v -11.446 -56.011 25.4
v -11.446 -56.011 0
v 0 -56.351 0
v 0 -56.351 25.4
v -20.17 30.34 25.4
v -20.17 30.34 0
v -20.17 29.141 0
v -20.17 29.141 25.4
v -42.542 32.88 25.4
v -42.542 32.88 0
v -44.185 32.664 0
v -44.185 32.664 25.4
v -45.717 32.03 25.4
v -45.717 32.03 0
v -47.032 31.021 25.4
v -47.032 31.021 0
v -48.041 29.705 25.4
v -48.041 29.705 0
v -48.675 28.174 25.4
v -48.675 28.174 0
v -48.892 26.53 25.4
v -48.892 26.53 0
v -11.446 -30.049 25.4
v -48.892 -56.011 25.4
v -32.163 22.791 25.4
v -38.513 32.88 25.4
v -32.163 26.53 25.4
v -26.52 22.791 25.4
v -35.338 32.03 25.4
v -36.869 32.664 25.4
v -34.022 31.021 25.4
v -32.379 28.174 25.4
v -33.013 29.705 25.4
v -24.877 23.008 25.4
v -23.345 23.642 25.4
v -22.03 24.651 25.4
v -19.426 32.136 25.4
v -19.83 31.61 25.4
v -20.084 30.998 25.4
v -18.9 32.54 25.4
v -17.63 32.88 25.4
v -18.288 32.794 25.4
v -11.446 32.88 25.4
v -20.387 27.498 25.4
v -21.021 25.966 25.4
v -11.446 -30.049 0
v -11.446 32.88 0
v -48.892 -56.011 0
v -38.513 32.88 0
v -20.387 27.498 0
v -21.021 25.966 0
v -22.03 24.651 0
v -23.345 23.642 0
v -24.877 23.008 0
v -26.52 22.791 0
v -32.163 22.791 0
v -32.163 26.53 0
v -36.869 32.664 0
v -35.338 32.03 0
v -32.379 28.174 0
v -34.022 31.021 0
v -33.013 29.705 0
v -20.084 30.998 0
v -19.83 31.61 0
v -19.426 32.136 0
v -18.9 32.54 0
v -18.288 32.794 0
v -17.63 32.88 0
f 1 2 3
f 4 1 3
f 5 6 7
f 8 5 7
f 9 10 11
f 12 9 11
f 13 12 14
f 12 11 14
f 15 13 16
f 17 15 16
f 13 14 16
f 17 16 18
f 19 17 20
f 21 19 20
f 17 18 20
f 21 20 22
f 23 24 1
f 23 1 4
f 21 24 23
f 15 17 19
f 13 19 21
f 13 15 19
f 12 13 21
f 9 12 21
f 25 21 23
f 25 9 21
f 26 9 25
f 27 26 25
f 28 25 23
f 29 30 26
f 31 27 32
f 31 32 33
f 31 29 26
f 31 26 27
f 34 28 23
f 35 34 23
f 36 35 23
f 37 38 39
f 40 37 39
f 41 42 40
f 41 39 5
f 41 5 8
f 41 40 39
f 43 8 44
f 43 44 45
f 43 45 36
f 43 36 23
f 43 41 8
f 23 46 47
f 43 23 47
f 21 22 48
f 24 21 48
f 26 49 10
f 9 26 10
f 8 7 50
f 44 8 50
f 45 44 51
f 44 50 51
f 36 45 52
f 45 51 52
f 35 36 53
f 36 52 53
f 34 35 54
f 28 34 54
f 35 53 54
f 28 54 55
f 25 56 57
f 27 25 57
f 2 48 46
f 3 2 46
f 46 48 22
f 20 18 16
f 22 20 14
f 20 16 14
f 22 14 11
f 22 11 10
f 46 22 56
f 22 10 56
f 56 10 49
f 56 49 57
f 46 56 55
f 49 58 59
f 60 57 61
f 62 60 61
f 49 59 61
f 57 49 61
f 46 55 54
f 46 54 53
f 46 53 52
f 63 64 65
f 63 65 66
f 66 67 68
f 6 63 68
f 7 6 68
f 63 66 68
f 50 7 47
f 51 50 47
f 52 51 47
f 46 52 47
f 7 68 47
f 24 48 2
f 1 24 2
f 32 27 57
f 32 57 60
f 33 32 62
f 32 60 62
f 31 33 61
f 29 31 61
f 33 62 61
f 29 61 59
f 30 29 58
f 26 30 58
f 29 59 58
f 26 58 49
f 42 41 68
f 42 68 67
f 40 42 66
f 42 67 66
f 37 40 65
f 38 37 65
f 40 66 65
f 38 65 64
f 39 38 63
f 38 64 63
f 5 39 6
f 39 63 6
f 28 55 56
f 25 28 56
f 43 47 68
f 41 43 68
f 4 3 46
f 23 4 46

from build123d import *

# Parameters (mm, degrees)
F1_DEPTH = 25.4


with BuildPart() as f1:
    # F0 (on Top) → F1 (new body)
    with BuildSketch(Plane.XY):
        with BuildLine():
            Line((-38.512521, 32.880403), (-42.541664, 32.880403))
            ThreePointArc((-42.541664, 32.880403), (-47.031792, 31.020531), (-48.891664, 26.530403))
            Line((-48.891664, 26.530403), (-48.891664, -56.011409))
            Line((-48.891664, -56.011409), (-11.445787, -56.011409))
            Line((-11.445787, -56.011409), (0, -56.350652))
            Line((0, -56.350652), (-11.445787, -30.049009))
            Line((-11.445787, -30.049009), (-11.445787, 32.880403))
            Line((-11.445787, 32.880403), (-17.630178, 32.880403))
            ThreePointArc((-17.630178, 32.880403), (-19.426229, 32.136454), (-20.170178, 30.340403))
            Line((-20.170178, 30.340403), (-20.170178, 29.141145))
            ThreePointArc((-20.170178, 29.141145), (-22.03005, 24.651017), (-26.520178, 22.791145))
            Line((-26.520178, 22.791145), (-32.162521, 22.791145))
            Line((-32.162521, 22.791145), (-32.162521, 26.530403))
            ThreePointArc((-32.162521, 26.530403), (-34.022393, 31.020531), (-38.512521, 32.880403))
        make_face()
    extrude(amount=F1_DEPTH)


solid = f1.part
